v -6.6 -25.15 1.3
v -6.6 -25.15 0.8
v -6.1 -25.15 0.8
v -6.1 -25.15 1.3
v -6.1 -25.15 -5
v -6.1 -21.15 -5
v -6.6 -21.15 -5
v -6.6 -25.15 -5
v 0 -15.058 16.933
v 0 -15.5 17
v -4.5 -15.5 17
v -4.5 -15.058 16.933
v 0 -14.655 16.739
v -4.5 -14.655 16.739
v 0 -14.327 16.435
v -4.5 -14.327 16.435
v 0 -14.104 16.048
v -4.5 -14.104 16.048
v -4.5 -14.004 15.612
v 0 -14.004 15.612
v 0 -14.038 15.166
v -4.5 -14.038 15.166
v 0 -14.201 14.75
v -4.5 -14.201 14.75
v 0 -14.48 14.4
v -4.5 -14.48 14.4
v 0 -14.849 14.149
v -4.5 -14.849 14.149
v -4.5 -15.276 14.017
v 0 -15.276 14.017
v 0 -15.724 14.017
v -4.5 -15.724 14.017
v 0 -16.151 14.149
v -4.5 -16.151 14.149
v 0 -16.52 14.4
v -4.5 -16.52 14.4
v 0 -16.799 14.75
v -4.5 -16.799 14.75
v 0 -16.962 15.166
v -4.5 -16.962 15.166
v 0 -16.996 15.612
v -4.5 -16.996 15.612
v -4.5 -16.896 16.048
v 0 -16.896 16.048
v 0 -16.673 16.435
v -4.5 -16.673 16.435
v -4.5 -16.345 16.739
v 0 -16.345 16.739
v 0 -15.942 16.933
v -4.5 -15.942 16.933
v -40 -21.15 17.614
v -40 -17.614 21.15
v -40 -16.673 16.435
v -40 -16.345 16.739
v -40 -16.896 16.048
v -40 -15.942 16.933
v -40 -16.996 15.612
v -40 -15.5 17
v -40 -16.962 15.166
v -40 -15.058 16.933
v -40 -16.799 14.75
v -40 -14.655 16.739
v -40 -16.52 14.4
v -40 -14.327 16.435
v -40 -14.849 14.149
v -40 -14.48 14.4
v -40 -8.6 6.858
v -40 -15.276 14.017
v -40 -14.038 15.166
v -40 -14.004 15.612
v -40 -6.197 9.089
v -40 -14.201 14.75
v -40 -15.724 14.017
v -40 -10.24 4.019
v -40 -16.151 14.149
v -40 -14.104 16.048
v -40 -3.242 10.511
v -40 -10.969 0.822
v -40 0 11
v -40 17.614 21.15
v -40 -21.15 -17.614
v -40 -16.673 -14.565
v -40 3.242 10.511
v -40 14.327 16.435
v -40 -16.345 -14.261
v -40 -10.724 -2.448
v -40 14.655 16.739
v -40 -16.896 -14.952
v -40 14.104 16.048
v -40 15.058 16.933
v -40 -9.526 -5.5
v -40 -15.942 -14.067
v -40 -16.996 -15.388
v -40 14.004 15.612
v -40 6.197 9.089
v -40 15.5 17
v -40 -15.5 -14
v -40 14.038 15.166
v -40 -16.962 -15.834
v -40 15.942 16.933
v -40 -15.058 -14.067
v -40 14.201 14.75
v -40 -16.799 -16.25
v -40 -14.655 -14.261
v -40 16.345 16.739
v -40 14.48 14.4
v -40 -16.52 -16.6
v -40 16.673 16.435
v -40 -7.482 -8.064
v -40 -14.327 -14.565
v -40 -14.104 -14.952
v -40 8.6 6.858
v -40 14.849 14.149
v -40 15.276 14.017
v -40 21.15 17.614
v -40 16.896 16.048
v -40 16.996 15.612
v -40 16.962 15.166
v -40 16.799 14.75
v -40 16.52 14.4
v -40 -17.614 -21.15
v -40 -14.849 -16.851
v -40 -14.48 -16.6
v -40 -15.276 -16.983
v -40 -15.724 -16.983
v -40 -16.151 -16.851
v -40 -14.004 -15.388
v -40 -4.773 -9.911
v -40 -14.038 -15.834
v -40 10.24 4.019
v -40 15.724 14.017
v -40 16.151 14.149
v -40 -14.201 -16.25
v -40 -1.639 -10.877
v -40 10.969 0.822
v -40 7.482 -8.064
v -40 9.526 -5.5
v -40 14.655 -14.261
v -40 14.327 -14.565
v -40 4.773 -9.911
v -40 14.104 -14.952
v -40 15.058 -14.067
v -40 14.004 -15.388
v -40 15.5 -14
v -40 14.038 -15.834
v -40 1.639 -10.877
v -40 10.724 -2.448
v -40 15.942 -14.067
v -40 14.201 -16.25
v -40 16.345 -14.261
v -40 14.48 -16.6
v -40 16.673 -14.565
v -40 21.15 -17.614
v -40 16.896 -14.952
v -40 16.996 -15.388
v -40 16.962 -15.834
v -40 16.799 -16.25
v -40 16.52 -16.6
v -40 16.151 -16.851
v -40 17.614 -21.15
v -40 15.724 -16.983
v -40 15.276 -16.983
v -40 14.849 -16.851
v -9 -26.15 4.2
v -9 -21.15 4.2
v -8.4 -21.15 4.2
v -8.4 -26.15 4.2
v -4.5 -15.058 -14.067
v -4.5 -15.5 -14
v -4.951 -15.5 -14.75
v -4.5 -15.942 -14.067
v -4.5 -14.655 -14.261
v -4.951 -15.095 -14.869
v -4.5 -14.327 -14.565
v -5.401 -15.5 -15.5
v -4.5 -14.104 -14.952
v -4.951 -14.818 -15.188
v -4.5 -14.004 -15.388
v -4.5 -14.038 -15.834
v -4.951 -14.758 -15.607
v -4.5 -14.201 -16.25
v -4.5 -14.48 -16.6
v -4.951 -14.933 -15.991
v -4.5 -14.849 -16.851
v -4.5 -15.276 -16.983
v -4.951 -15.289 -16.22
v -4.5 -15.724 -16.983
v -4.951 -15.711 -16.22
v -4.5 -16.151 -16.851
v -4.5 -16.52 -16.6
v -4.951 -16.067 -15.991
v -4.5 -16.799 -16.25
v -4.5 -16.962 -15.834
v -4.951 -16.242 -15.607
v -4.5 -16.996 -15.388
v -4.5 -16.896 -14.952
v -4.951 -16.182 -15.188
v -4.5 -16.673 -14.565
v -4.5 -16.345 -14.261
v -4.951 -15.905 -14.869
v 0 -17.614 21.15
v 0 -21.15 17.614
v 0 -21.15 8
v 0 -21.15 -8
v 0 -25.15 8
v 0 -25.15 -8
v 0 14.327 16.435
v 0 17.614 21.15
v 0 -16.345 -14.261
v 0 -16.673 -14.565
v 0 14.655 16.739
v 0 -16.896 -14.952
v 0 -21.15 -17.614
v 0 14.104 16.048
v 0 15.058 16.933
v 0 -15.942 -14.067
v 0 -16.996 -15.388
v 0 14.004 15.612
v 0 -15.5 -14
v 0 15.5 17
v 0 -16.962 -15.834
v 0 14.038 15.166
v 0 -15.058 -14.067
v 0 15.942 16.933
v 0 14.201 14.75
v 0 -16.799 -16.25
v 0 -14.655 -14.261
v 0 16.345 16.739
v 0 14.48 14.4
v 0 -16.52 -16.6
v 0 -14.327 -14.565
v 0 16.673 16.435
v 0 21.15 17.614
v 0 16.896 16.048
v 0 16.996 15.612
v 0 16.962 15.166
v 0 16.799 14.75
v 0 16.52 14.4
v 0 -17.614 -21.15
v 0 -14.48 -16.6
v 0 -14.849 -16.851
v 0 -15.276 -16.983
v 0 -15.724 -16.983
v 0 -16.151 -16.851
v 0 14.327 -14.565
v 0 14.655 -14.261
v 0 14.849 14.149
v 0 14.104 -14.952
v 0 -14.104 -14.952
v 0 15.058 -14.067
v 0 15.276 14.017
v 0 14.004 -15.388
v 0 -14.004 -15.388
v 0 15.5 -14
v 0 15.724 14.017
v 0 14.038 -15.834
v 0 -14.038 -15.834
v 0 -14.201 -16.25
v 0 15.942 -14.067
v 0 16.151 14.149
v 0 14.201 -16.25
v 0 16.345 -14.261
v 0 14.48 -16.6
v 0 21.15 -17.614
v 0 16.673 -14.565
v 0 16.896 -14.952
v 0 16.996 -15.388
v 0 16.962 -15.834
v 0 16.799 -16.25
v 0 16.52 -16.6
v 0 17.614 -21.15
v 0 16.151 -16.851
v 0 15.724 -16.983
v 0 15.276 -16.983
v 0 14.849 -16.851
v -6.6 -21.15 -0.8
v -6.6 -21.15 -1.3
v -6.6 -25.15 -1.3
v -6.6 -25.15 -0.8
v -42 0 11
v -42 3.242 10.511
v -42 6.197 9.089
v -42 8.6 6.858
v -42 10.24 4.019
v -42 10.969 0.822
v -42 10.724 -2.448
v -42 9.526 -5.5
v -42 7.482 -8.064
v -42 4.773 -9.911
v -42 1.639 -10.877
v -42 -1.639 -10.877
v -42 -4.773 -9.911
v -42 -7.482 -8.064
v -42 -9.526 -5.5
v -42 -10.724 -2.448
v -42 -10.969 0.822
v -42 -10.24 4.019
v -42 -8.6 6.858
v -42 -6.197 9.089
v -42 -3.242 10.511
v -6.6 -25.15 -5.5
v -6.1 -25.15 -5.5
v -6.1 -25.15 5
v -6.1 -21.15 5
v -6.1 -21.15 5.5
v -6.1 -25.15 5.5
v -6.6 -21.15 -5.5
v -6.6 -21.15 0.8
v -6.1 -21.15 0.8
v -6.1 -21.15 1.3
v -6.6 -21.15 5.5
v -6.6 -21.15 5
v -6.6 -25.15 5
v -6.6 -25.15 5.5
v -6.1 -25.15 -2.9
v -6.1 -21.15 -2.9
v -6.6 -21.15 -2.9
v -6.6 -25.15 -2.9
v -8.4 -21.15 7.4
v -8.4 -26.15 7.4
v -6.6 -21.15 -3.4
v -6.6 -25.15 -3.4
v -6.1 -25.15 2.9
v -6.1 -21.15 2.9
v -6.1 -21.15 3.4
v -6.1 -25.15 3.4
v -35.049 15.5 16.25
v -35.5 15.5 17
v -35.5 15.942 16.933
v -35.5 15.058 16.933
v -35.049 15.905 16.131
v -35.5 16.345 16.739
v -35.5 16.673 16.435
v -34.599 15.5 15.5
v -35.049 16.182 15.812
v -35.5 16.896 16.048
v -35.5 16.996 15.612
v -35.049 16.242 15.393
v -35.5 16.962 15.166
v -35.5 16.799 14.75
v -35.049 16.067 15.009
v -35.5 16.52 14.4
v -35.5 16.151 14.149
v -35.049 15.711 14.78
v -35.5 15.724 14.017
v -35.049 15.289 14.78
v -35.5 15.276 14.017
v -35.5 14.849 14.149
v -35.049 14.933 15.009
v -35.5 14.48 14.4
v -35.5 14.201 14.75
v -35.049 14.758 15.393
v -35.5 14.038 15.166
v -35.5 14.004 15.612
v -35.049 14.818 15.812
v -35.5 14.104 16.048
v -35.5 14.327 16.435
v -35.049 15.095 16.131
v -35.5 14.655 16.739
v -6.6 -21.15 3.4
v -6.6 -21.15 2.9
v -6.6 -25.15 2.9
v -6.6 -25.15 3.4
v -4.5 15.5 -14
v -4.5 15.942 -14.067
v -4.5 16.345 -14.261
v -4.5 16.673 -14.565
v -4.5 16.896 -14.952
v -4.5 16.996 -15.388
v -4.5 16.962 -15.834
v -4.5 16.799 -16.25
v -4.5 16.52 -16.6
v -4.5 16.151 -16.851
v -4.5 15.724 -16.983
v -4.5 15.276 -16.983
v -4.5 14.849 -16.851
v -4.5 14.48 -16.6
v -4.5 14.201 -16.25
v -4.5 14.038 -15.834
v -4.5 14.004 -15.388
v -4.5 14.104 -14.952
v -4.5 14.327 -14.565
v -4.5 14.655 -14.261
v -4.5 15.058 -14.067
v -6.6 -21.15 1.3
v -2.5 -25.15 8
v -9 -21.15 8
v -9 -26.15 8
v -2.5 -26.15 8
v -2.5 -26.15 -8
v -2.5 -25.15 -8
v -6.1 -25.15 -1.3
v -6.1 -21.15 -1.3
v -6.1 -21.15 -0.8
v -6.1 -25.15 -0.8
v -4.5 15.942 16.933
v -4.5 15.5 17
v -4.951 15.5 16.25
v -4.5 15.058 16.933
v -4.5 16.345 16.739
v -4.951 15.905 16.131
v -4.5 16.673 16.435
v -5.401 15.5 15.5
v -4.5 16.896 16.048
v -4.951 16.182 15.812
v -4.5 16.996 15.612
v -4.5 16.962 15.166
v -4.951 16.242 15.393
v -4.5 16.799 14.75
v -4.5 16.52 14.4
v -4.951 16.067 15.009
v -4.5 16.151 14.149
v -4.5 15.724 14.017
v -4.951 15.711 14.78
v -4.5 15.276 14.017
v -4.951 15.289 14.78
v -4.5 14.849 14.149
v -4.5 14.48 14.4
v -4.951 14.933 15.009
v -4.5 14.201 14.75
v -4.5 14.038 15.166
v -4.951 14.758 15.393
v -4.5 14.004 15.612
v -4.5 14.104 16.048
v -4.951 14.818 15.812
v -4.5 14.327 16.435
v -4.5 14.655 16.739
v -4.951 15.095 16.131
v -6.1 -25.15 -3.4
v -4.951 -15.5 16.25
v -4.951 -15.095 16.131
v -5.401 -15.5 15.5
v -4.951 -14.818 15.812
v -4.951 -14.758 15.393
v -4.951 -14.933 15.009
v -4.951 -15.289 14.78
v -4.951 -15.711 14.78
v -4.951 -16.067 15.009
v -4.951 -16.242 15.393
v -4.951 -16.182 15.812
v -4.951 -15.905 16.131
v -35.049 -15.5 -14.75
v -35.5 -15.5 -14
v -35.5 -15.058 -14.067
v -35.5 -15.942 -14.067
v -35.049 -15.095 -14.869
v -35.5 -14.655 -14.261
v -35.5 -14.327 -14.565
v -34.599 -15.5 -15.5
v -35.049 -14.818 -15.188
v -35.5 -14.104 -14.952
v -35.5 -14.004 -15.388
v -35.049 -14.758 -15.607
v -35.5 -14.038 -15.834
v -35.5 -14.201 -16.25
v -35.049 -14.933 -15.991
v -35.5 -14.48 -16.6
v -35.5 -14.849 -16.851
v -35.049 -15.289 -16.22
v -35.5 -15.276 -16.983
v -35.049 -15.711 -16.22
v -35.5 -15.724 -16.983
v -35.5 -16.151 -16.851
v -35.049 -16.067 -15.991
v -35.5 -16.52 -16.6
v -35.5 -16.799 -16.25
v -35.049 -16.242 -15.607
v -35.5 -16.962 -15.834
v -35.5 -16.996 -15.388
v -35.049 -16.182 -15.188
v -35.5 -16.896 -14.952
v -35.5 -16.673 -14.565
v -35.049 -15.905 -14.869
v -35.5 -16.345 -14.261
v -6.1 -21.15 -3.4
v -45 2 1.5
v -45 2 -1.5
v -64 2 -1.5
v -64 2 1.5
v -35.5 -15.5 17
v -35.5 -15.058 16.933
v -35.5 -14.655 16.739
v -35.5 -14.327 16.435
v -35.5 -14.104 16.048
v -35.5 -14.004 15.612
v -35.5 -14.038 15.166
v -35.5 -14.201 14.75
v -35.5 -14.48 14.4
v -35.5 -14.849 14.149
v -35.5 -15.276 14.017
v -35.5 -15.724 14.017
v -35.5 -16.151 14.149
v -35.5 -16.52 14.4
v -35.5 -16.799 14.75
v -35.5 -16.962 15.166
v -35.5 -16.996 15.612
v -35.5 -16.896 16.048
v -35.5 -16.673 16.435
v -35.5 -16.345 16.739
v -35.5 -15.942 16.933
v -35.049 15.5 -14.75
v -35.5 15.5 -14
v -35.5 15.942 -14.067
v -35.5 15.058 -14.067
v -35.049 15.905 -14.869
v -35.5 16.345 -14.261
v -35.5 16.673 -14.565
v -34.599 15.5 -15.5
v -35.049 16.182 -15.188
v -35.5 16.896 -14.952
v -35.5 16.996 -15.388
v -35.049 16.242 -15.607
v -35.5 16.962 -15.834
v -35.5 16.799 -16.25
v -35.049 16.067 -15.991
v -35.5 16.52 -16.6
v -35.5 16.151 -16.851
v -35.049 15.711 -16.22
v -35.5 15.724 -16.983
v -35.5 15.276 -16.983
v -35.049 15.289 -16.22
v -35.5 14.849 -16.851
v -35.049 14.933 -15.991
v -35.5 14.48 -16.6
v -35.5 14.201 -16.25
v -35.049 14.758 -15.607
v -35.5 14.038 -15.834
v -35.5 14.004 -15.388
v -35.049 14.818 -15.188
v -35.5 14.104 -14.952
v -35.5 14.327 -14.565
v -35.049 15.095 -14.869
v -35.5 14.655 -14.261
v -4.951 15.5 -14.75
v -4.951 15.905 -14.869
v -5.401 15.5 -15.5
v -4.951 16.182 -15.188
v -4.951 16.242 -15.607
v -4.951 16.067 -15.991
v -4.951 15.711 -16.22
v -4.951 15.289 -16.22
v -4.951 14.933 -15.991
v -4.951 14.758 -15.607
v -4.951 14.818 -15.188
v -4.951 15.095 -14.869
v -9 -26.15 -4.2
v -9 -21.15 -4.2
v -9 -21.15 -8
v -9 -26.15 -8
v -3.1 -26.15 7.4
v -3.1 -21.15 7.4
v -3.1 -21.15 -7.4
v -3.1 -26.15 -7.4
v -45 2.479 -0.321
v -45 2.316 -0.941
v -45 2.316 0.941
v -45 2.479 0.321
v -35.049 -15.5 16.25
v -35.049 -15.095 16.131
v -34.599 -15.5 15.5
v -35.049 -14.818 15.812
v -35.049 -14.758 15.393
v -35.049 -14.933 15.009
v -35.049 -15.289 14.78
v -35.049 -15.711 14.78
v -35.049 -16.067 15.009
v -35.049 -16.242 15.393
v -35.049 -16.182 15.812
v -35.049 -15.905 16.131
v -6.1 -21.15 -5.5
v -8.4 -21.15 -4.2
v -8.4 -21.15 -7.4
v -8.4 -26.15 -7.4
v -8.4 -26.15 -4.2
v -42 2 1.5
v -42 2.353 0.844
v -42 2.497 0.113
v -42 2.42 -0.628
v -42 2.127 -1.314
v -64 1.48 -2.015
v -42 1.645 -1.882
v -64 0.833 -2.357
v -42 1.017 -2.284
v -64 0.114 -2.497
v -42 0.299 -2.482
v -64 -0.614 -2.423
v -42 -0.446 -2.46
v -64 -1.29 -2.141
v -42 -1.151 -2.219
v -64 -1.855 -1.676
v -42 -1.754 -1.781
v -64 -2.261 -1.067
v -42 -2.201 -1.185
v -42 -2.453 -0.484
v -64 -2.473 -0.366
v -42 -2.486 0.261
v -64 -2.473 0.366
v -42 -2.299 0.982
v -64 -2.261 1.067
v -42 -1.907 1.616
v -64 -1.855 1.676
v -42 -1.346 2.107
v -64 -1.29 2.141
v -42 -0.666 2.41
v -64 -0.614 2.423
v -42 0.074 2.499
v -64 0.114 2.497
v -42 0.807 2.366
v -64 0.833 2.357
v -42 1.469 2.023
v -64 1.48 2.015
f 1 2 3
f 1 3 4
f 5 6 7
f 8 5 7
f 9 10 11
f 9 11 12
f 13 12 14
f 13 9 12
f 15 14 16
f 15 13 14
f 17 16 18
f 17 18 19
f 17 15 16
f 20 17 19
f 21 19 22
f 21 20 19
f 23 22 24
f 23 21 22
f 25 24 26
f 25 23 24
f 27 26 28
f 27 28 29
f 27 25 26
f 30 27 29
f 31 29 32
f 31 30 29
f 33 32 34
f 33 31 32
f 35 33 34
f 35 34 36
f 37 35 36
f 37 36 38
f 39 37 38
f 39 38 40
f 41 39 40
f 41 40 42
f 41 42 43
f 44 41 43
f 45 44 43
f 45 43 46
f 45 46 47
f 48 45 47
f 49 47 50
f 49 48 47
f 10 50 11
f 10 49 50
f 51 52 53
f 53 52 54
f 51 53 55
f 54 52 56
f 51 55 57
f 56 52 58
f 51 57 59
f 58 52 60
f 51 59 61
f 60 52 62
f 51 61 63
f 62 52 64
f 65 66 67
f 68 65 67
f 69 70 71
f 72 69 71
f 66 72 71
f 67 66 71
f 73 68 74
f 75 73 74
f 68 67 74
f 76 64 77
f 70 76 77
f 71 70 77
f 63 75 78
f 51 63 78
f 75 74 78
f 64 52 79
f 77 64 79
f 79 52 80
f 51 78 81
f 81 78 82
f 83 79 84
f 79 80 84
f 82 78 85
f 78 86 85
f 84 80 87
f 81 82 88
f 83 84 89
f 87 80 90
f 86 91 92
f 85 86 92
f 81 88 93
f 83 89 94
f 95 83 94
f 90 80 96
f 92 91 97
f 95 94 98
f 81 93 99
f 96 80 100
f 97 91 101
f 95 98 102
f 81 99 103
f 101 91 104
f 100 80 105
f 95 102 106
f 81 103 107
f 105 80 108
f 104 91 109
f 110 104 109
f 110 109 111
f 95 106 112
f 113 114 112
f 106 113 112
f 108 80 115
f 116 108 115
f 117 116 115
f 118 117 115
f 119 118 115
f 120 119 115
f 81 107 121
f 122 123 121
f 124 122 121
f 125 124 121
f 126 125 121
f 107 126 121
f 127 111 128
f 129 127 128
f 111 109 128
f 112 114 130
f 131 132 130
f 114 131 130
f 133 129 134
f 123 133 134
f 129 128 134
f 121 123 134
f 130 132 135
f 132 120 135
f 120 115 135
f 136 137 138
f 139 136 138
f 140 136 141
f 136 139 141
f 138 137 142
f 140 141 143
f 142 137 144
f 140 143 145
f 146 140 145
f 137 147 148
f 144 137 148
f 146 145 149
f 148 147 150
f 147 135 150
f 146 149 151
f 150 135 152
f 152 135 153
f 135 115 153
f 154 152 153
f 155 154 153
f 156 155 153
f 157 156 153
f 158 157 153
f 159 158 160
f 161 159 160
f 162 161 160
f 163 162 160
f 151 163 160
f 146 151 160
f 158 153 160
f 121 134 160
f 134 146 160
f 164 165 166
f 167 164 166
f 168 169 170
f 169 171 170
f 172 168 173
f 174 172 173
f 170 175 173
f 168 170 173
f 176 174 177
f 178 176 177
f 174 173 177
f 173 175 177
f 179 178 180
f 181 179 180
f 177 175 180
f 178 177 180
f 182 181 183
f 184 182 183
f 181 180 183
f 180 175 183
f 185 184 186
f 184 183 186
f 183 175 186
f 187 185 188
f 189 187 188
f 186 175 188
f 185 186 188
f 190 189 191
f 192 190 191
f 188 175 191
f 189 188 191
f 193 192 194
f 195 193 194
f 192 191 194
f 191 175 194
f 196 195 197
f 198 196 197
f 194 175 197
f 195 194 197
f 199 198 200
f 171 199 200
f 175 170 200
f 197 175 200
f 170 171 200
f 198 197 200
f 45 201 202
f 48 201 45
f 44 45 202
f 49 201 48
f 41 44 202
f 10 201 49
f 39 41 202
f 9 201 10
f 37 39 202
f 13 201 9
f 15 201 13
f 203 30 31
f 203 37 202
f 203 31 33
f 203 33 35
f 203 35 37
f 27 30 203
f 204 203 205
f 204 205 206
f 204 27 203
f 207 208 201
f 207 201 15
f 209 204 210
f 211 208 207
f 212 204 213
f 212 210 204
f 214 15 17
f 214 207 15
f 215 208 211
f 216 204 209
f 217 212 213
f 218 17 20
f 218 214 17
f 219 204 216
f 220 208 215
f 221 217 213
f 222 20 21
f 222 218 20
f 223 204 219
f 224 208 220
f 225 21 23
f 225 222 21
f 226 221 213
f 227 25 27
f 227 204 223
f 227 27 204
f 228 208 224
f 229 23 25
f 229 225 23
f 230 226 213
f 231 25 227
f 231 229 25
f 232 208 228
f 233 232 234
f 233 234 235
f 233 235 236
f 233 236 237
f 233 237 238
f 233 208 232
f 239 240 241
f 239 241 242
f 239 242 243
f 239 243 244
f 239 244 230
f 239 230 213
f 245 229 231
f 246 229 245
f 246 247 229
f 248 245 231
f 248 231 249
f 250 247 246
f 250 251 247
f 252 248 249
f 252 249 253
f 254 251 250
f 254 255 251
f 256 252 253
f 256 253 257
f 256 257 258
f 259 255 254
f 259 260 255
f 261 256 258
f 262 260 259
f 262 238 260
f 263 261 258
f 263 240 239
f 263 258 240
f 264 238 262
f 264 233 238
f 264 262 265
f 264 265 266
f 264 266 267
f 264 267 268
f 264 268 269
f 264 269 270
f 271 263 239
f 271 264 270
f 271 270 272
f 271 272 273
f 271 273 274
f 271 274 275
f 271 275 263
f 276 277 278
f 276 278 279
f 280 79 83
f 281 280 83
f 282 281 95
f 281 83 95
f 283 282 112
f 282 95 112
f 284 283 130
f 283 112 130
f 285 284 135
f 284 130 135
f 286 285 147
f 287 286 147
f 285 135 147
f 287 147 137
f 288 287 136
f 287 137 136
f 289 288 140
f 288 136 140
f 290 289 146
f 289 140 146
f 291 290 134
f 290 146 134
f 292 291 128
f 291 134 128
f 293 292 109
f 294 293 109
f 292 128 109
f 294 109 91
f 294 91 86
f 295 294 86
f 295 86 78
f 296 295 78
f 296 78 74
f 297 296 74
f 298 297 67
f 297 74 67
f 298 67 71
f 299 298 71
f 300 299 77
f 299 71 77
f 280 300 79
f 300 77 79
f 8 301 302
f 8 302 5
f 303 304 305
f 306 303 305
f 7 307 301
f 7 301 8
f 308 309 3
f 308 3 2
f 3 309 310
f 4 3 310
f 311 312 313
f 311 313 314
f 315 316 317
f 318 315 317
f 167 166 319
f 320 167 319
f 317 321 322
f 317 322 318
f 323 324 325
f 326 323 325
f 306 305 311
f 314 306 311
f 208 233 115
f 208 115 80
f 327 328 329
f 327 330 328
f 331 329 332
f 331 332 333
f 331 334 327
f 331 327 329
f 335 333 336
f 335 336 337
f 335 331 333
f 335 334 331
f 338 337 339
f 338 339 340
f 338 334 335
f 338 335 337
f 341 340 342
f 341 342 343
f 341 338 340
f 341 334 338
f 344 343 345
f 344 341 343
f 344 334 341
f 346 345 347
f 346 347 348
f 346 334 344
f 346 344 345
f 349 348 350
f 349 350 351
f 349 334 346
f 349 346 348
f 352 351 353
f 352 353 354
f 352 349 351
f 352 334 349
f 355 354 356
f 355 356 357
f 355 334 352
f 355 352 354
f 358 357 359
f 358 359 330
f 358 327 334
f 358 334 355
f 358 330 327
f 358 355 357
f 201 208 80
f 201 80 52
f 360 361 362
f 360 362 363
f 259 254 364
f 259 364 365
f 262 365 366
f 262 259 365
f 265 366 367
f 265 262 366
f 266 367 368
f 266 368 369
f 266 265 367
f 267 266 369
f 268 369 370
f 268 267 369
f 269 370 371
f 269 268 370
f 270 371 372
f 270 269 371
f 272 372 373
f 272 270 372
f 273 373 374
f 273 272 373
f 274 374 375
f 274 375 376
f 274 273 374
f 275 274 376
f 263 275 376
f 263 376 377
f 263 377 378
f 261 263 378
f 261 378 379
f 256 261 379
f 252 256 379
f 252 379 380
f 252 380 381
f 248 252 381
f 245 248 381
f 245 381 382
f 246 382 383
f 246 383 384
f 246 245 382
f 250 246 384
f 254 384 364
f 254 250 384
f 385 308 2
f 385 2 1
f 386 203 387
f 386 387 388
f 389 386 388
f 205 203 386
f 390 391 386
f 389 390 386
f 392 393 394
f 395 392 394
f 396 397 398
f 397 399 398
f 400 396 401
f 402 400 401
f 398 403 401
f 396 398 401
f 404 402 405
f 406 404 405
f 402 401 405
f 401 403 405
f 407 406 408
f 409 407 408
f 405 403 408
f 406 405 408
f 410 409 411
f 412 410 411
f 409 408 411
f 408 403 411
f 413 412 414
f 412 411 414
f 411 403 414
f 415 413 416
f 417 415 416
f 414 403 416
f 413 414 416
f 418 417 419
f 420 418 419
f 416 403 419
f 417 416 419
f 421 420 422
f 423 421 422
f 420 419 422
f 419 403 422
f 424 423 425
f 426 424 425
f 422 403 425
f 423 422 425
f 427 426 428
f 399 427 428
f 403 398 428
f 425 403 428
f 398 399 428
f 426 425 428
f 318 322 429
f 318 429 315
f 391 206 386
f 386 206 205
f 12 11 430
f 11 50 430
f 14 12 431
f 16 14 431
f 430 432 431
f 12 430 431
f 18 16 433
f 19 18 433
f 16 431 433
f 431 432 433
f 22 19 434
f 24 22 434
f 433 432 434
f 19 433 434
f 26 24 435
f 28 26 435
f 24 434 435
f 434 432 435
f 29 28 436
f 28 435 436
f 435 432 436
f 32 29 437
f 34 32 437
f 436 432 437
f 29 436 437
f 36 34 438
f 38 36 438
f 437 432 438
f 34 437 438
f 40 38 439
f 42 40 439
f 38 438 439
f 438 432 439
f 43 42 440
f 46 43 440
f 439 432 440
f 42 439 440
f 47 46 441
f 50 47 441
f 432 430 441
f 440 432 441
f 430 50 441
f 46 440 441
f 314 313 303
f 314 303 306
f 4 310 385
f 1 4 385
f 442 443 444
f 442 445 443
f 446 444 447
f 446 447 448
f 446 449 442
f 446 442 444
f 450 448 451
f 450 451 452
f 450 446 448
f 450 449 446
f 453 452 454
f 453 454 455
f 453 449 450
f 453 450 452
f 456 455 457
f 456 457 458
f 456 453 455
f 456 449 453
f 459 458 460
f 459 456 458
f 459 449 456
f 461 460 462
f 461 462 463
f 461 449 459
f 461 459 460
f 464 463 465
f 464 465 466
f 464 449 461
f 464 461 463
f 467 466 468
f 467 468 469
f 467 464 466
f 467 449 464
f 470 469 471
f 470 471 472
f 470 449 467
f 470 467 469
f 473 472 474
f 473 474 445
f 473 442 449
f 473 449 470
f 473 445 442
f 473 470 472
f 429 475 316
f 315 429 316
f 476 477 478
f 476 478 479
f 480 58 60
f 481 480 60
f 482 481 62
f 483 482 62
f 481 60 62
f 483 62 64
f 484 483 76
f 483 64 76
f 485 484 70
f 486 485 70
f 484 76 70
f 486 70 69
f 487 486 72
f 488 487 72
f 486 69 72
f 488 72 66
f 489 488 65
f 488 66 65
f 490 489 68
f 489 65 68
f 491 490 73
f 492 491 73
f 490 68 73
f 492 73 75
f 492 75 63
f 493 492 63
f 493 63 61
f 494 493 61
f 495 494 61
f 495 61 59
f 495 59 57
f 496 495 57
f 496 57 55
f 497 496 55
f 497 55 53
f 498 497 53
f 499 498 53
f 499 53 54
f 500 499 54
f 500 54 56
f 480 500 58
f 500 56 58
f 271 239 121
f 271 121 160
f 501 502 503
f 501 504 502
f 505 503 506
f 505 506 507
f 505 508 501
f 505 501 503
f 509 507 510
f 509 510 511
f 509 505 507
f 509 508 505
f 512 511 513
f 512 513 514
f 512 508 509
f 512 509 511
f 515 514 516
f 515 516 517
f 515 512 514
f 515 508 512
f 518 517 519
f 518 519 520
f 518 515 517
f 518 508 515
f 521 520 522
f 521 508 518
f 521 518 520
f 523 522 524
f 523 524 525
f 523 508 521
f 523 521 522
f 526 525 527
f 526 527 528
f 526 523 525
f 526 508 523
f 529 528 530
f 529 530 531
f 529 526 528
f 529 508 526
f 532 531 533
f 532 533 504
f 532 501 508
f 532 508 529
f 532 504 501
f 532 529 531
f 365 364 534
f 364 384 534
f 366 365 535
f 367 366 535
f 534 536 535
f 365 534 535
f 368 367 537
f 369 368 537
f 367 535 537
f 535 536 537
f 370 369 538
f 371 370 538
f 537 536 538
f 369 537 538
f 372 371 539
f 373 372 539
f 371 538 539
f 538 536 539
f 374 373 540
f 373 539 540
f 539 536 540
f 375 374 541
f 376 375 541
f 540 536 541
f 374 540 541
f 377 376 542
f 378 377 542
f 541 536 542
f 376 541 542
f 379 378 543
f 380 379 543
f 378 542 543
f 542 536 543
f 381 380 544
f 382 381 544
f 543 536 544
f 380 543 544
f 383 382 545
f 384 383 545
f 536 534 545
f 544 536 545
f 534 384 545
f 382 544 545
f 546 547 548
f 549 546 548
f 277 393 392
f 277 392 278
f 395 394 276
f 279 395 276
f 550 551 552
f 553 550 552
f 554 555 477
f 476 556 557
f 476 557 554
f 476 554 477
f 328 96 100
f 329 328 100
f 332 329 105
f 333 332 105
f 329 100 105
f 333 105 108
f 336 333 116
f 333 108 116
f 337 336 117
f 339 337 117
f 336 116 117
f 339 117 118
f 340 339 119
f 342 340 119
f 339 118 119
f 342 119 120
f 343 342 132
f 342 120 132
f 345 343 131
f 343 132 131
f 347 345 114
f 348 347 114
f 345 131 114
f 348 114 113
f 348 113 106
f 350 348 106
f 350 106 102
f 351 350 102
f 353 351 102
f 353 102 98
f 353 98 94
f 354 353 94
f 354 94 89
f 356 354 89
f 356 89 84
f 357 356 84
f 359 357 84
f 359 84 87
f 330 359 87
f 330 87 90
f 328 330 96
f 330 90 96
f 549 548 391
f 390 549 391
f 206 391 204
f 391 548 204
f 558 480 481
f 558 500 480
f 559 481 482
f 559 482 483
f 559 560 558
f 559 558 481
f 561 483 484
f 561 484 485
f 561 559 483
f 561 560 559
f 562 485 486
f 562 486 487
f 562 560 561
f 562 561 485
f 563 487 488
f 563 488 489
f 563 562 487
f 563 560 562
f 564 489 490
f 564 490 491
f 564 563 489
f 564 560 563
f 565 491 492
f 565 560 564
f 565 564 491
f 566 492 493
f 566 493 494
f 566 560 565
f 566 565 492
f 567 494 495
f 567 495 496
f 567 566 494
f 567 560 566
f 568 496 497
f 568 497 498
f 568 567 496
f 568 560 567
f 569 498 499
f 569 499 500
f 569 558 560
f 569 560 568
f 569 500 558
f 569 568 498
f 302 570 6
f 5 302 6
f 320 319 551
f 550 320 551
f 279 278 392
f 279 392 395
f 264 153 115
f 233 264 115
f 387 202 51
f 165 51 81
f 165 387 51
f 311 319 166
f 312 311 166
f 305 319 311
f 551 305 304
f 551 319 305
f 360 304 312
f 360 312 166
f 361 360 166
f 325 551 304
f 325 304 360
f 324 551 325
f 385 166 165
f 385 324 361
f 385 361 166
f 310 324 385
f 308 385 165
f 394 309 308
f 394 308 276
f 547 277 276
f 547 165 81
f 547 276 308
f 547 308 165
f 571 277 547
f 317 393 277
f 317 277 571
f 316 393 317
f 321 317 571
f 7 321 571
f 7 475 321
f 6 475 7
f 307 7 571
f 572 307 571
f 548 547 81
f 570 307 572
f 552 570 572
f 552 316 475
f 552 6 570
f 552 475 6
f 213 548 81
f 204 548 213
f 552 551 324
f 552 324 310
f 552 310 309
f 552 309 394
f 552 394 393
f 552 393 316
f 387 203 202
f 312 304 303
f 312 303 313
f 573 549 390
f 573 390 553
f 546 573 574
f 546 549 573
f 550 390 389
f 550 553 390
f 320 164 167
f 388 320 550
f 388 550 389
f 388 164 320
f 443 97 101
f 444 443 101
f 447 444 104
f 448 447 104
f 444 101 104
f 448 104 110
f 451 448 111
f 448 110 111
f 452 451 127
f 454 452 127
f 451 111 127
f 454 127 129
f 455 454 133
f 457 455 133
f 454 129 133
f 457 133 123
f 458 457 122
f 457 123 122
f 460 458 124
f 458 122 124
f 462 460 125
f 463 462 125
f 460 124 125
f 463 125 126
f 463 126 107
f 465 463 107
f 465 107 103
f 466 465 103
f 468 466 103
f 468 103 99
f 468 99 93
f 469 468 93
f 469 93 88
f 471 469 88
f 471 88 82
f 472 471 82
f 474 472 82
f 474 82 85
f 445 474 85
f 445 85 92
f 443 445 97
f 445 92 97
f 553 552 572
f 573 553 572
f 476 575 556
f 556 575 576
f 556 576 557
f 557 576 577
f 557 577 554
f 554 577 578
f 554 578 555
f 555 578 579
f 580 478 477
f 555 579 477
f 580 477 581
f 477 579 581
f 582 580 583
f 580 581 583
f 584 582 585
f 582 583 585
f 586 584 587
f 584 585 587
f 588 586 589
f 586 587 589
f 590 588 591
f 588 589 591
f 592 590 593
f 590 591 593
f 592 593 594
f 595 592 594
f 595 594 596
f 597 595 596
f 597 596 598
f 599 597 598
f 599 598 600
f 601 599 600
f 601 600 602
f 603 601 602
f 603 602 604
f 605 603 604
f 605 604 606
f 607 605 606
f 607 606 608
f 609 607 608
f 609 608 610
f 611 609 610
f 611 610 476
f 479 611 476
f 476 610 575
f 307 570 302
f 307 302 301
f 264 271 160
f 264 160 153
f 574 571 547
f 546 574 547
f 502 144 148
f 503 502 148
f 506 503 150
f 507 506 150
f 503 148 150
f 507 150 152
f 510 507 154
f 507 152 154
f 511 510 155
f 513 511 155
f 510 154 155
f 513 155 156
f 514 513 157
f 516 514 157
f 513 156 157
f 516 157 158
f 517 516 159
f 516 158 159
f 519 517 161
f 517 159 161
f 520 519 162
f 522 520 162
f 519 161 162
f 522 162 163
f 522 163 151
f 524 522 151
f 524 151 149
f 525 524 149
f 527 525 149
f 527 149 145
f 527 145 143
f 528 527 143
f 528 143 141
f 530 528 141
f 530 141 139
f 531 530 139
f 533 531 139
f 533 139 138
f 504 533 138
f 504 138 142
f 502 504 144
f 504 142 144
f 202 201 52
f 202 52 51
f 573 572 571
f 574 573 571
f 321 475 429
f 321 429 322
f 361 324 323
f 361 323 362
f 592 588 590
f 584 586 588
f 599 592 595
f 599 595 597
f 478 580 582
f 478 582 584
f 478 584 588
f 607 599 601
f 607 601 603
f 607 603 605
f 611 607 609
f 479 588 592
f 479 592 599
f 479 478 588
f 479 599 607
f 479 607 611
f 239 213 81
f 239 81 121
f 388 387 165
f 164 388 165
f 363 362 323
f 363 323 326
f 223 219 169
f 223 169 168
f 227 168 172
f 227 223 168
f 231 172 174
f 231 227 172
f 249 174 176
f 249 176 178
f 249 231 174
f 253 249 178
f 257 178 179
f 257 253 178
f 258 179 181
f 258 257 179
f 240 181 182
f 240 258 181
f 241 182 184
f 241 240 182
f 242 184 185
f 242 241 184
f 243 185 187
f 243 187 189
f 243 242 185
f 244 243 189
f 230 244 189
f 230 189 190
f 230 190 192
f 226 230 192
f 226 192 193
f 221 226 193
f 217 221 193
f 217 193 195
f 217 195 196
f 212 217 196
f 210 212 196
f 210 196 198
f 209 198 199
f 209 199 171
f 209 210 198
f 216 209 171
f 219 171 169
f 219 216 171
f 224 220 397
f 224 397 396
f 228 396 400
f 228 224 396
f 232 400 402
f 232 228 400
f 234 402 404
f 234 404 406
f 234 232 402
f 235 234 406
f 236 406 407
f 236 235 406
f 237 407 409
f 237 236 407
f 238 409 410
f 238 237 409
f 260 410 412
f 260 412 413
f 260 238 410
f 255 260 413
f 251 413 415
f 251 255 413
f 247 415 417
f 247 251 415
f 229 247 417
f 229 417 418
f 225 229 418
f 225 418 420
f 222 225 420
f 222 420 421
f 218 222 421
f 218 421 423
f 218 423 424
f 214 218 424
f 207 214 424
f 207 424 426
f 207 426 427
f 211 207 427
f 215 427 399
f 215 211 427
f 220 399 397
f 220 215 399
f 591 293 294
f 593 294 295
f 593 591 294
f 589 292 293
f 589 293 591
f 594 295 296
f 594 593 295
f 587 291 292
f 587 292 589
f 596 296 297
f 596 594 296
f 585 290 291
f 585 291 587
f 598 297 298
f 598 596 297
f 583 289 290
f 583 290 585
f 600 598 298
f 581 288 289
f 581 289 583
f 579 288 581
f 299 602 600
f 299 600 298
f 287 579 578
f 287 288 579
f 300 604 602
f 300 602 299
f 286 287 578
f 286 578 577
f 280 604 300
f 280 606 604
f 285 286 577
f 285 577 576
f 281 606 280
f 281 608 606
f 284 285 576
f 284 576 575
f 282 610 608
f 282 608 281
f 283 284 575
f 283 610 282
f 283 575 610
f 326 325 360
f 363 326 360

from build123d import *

# Parameters (mm, degrees)
PAD001_DEPTH         = 40
SKETCH018_R          = 1.5
HOLE_DEPTH           = 4.5
HOLE_TIPS_R          = 1.5
SKETCH002_R          = 1.5
HOLE001_DEPTH        = 4.5
HOLE001_TIPS_R       = 1.5
SKETCH003_R          = 11
PAD002_DEPTH         = 2
PAD003_DEPTH         = 22
SKETCH005_R          = 2.5
PAD004_DEPTH         = 3
SKETCH006_W          = 16
SKETCH006_H          = 4
PAD005_DEPTH         = 2.5
PAD006_DEPTH         = 5
SKETCH008_W          = 0.5
SKETCH008_H          = 0.5
PAD007_DEPTH         = 4
BODY_PLACEMENT_ANGLE = 90


with BuildPart() as part:
    # Sketch017 → Pad001 (new body)
    with BuildSketch(Plane.XY):
        Polygon((-17.614466, 21.15), (17.614466, 21.15), (21.15, 17.614466), (21.15, -17.614466), (17.614466, -21.15), (-17.614466, -21.15), (-21.15, -17.614466), (-21.15, 17.614466), align=None)
    extrude(amount=PAD001_DEPTH)

    # Sketch018 (on Face10 of Pad001) → Hole (cut)
    with BuildSketch(Plane.XY.offset(40)):
        with Locations((15.5, 15.5)):
            Circle(SKETCH018_R)
        with Locations((-15.5, 15.5)):
            Circle(SKETCH018_R)
        with Locations((-15.5, -15.5)):
            Circle(SKETCH018_R)
        with Locations((15.5, -15.5)):
            Circle(SKETCH018_R)
    extrude(amount=-HOLE_DEPTH, mode=Mode.SUBTRACT)

    # Hole tips → Hole tip 1 section 0
    with BuildSketch(Plane.XY.offset(35.5), mode=Mode.PRIVATE) as hole_tip_1_s0:
        with Locations((15.5, 15.5)):
            Circle(HOLE_TIPS_R)
    loft([hole_tip_1_s0.sketch, Vertex(15.5, 15.5, 34.598709)], mode=Mode.SUBTRACT)

    # Hole tips → Hole tip 2 section 0
    with BuildSketch(Plane.XY.offset(35.5), mode=Mode.PRIVATE) as hole_tip_2_s0:
        with Locations((-15.5, 15.5)):
            Circle(HOLE_TIPS_R)
    loft([hole_tip_2_s0.sketch, Vertex(-15.5, 15.5, 34.598709)], mode=Mode.SUBTRACT)

    # Hole tips → Hole tip 3 section 0
    with BuildSketch(Plane.XY.offset(35.5), mode=Mode.PRIVATE) as hole_tip_3_s0:
        with Locations((-15.5, -15.5)):
            Circle(HOLE_TIPS_R)
    loft([hole_tip_3_s0.sketch, Vertex(-15.5, -15.5, 34.598709)], mode=Mode.SUBTRACT)

    # Hole tips → Hole tip 4 section 0
    with BuildSketch(Plane.XY.offset(35.5), mode=Mode.PRIVATE) as hole_tip_4_s0:
        with Locations((15.5, -15.5)):
            Circle(HOLE_TIPS_R)
    loft([hole_tip_4_s0.sketch, Vertex(15.5, -15.5, 34.598709)], mode=Mode.SUBTRACT)

    # Sketch002 → Hole001 (cut)
    with BuildSketch(Plane.XY):
        with Locations((-15.5, 15.5)):
            Circle(SKETCH002_R)
        with Locations((-15.5, -15.5)):
            Circle(SKETCH002_R)
        with Locations((15.5, -15.5)):
            Circle(SKETCH002_R)
        with Locations((15.5, 15.5)):
            Circle(SKETCH002_R)
    extrude(amount=HOLE001_DEPTH, mode=Mode.SUBTRACT)

    # Hole001 tips → Hole001 tip 1 section 0
    with BuildSketch(Plane.XY.offset(4.5), mode=Mode.PRIVATE) as hole001_tip_1_s0:
        with Locations((-15.5, 15.5)):
            Circle(HOLE001_TIPS_R)
    loft([hole001_tip_1_s0.sketch, Vertex(-15.5, 15.5, 5.401291)], mode=Mode.SUBTRACT)

    # Hole001 tips → Hole001 tip 2 section 0
    with BuildSketch(Plane.XY.offset(4.5), mode=Mode.PRIVATE) as hole001_tip_2_s0:
        with Locations((-15.5, -15.5)):
            Circle(HOLE001_TIPS_R)
    loft([hole001_tip_2_s0.sketch, Vertex(-15.5, -15.5, 5.401291)], mode=Mode.SUBTRACT)

    # Hole001 tips → Hole001 tip 3 section 0
    with BuildSketch(Plane.XY.offset(4.5), mode=Mode.PRIVATE) as hole001_tip_3_s0:
        with Locations((15.5, -15.5)):
            Circle(HOLE001_TIPS_R)
    loft([hole001_tip_3_s0.sketch, Vertex(15.5, -15.5, 5.401291)], mode=Mode.SUBTRACT)

    # Hole001 tips → Hole001 tip 4 section 0
    with BuildSketch(Plane.XY.offset(4.5), mode=Mode.PRIVATE) as hole001_tip_4_s0:
        with Locations((15.5, 15.5)):
            Circle(HOLE001_TIPS_R)
    loft([hole001_tip_4_s0.sketch, Vertex(15.5, 15.5, 5.401291)], mode=Mode.SUBTRACT)

    # Sketch003 (on Face5 of Hole001) → Pad002 (join)
    with BuildSketch(Plane.XY.offset(40)):
        Circle(SKETCH003_R)
    extrude(amount=PAD002_DEPTH)

    # Sketch004 (on Face27 of Pad002) → Pad003 (join)
    with BuildSketch(Plane.XY.offset(42)):
        with BuildLine():
            ThreePointArc((-1.5, 2), (0, -2.5), (1.5, 2))
            Line((-1.5, 2), (1.5, 2))
        make_face()
    extrude(amount=PAD003_DEPTH)

    # Sketch005 (on Face27 of Pad002) → Pad004 (join)
    with BuildSketch(Plane.XY.offset(42)):
        Circle(SKETCH005_R)
    extrude(amount=PAD004_DEPTH)

    # Sketch006 (on Face4 of Pad004) → Pad005 (join)
    with BuildSketch(Plane(origin=(0, 0, 0), x_dir=(1, 0, 0), z_dir=(0, 0, -1))):
        with Locations((0, 23.15)):
            Rectangle(SKETCH006_W, SKETCH006_H)
    extrude(amount=-PAD005_DEPTH)

    # Sketch007 (on Face10 of Pad005) → Pad006 (join)
    with BuildSketch(Plane.XZ.offset(21.15)):
        Polygon((-4.2, 9), (-8, 9), (-8, 2.5), (8, 2.5), (8, 9), (4.2, 9), (4.2, 8.4), (7.4, 8.4), (7.4, 3.1), (-7.4, 3.1), (-7.4, 8.4), (-4.2, 8.4), align=None)
    extrude(amount=PAD006_DEPTH)

    # Sketch008 (on Face10 of Pad006) → Pad007 (join)
    with BuildSketch(Plane.XZ.offset(21.15)):
        with Locations((-5.25, 6.35)):
            Rectangle(SKETCH008_W, SKETCH008_H)
        with Locations((-3.15, 6.35)):
            Rectangle(SKETCH008_W, SKETCH008_H)
        with Locations((-1.05, 6.35)):
            Rectangle(SKETCH008_W, SKETCH008_H)
        with Locations((1.05, 6.35)):
            Rectangle(SKETCH008_W, SKETCH008_H)
        with Locations((3.15, 6.35)):
            Rectangle(SKETCH008_W, SKETCH008_H)
        with Locations((5.25, 6.35)):
            Rectangle(SKETCH008_W, SKETCH008_H)
    extrude(amount=PAD007_DEPTH)


with BuildPart() as part_1:
    # Body placement: moved
    add(part.part.rotate(Axis((0, 0, 0), (0, -1, 0)), BODY_PLACEMENT_ANGLE))


solid = part_1.part
